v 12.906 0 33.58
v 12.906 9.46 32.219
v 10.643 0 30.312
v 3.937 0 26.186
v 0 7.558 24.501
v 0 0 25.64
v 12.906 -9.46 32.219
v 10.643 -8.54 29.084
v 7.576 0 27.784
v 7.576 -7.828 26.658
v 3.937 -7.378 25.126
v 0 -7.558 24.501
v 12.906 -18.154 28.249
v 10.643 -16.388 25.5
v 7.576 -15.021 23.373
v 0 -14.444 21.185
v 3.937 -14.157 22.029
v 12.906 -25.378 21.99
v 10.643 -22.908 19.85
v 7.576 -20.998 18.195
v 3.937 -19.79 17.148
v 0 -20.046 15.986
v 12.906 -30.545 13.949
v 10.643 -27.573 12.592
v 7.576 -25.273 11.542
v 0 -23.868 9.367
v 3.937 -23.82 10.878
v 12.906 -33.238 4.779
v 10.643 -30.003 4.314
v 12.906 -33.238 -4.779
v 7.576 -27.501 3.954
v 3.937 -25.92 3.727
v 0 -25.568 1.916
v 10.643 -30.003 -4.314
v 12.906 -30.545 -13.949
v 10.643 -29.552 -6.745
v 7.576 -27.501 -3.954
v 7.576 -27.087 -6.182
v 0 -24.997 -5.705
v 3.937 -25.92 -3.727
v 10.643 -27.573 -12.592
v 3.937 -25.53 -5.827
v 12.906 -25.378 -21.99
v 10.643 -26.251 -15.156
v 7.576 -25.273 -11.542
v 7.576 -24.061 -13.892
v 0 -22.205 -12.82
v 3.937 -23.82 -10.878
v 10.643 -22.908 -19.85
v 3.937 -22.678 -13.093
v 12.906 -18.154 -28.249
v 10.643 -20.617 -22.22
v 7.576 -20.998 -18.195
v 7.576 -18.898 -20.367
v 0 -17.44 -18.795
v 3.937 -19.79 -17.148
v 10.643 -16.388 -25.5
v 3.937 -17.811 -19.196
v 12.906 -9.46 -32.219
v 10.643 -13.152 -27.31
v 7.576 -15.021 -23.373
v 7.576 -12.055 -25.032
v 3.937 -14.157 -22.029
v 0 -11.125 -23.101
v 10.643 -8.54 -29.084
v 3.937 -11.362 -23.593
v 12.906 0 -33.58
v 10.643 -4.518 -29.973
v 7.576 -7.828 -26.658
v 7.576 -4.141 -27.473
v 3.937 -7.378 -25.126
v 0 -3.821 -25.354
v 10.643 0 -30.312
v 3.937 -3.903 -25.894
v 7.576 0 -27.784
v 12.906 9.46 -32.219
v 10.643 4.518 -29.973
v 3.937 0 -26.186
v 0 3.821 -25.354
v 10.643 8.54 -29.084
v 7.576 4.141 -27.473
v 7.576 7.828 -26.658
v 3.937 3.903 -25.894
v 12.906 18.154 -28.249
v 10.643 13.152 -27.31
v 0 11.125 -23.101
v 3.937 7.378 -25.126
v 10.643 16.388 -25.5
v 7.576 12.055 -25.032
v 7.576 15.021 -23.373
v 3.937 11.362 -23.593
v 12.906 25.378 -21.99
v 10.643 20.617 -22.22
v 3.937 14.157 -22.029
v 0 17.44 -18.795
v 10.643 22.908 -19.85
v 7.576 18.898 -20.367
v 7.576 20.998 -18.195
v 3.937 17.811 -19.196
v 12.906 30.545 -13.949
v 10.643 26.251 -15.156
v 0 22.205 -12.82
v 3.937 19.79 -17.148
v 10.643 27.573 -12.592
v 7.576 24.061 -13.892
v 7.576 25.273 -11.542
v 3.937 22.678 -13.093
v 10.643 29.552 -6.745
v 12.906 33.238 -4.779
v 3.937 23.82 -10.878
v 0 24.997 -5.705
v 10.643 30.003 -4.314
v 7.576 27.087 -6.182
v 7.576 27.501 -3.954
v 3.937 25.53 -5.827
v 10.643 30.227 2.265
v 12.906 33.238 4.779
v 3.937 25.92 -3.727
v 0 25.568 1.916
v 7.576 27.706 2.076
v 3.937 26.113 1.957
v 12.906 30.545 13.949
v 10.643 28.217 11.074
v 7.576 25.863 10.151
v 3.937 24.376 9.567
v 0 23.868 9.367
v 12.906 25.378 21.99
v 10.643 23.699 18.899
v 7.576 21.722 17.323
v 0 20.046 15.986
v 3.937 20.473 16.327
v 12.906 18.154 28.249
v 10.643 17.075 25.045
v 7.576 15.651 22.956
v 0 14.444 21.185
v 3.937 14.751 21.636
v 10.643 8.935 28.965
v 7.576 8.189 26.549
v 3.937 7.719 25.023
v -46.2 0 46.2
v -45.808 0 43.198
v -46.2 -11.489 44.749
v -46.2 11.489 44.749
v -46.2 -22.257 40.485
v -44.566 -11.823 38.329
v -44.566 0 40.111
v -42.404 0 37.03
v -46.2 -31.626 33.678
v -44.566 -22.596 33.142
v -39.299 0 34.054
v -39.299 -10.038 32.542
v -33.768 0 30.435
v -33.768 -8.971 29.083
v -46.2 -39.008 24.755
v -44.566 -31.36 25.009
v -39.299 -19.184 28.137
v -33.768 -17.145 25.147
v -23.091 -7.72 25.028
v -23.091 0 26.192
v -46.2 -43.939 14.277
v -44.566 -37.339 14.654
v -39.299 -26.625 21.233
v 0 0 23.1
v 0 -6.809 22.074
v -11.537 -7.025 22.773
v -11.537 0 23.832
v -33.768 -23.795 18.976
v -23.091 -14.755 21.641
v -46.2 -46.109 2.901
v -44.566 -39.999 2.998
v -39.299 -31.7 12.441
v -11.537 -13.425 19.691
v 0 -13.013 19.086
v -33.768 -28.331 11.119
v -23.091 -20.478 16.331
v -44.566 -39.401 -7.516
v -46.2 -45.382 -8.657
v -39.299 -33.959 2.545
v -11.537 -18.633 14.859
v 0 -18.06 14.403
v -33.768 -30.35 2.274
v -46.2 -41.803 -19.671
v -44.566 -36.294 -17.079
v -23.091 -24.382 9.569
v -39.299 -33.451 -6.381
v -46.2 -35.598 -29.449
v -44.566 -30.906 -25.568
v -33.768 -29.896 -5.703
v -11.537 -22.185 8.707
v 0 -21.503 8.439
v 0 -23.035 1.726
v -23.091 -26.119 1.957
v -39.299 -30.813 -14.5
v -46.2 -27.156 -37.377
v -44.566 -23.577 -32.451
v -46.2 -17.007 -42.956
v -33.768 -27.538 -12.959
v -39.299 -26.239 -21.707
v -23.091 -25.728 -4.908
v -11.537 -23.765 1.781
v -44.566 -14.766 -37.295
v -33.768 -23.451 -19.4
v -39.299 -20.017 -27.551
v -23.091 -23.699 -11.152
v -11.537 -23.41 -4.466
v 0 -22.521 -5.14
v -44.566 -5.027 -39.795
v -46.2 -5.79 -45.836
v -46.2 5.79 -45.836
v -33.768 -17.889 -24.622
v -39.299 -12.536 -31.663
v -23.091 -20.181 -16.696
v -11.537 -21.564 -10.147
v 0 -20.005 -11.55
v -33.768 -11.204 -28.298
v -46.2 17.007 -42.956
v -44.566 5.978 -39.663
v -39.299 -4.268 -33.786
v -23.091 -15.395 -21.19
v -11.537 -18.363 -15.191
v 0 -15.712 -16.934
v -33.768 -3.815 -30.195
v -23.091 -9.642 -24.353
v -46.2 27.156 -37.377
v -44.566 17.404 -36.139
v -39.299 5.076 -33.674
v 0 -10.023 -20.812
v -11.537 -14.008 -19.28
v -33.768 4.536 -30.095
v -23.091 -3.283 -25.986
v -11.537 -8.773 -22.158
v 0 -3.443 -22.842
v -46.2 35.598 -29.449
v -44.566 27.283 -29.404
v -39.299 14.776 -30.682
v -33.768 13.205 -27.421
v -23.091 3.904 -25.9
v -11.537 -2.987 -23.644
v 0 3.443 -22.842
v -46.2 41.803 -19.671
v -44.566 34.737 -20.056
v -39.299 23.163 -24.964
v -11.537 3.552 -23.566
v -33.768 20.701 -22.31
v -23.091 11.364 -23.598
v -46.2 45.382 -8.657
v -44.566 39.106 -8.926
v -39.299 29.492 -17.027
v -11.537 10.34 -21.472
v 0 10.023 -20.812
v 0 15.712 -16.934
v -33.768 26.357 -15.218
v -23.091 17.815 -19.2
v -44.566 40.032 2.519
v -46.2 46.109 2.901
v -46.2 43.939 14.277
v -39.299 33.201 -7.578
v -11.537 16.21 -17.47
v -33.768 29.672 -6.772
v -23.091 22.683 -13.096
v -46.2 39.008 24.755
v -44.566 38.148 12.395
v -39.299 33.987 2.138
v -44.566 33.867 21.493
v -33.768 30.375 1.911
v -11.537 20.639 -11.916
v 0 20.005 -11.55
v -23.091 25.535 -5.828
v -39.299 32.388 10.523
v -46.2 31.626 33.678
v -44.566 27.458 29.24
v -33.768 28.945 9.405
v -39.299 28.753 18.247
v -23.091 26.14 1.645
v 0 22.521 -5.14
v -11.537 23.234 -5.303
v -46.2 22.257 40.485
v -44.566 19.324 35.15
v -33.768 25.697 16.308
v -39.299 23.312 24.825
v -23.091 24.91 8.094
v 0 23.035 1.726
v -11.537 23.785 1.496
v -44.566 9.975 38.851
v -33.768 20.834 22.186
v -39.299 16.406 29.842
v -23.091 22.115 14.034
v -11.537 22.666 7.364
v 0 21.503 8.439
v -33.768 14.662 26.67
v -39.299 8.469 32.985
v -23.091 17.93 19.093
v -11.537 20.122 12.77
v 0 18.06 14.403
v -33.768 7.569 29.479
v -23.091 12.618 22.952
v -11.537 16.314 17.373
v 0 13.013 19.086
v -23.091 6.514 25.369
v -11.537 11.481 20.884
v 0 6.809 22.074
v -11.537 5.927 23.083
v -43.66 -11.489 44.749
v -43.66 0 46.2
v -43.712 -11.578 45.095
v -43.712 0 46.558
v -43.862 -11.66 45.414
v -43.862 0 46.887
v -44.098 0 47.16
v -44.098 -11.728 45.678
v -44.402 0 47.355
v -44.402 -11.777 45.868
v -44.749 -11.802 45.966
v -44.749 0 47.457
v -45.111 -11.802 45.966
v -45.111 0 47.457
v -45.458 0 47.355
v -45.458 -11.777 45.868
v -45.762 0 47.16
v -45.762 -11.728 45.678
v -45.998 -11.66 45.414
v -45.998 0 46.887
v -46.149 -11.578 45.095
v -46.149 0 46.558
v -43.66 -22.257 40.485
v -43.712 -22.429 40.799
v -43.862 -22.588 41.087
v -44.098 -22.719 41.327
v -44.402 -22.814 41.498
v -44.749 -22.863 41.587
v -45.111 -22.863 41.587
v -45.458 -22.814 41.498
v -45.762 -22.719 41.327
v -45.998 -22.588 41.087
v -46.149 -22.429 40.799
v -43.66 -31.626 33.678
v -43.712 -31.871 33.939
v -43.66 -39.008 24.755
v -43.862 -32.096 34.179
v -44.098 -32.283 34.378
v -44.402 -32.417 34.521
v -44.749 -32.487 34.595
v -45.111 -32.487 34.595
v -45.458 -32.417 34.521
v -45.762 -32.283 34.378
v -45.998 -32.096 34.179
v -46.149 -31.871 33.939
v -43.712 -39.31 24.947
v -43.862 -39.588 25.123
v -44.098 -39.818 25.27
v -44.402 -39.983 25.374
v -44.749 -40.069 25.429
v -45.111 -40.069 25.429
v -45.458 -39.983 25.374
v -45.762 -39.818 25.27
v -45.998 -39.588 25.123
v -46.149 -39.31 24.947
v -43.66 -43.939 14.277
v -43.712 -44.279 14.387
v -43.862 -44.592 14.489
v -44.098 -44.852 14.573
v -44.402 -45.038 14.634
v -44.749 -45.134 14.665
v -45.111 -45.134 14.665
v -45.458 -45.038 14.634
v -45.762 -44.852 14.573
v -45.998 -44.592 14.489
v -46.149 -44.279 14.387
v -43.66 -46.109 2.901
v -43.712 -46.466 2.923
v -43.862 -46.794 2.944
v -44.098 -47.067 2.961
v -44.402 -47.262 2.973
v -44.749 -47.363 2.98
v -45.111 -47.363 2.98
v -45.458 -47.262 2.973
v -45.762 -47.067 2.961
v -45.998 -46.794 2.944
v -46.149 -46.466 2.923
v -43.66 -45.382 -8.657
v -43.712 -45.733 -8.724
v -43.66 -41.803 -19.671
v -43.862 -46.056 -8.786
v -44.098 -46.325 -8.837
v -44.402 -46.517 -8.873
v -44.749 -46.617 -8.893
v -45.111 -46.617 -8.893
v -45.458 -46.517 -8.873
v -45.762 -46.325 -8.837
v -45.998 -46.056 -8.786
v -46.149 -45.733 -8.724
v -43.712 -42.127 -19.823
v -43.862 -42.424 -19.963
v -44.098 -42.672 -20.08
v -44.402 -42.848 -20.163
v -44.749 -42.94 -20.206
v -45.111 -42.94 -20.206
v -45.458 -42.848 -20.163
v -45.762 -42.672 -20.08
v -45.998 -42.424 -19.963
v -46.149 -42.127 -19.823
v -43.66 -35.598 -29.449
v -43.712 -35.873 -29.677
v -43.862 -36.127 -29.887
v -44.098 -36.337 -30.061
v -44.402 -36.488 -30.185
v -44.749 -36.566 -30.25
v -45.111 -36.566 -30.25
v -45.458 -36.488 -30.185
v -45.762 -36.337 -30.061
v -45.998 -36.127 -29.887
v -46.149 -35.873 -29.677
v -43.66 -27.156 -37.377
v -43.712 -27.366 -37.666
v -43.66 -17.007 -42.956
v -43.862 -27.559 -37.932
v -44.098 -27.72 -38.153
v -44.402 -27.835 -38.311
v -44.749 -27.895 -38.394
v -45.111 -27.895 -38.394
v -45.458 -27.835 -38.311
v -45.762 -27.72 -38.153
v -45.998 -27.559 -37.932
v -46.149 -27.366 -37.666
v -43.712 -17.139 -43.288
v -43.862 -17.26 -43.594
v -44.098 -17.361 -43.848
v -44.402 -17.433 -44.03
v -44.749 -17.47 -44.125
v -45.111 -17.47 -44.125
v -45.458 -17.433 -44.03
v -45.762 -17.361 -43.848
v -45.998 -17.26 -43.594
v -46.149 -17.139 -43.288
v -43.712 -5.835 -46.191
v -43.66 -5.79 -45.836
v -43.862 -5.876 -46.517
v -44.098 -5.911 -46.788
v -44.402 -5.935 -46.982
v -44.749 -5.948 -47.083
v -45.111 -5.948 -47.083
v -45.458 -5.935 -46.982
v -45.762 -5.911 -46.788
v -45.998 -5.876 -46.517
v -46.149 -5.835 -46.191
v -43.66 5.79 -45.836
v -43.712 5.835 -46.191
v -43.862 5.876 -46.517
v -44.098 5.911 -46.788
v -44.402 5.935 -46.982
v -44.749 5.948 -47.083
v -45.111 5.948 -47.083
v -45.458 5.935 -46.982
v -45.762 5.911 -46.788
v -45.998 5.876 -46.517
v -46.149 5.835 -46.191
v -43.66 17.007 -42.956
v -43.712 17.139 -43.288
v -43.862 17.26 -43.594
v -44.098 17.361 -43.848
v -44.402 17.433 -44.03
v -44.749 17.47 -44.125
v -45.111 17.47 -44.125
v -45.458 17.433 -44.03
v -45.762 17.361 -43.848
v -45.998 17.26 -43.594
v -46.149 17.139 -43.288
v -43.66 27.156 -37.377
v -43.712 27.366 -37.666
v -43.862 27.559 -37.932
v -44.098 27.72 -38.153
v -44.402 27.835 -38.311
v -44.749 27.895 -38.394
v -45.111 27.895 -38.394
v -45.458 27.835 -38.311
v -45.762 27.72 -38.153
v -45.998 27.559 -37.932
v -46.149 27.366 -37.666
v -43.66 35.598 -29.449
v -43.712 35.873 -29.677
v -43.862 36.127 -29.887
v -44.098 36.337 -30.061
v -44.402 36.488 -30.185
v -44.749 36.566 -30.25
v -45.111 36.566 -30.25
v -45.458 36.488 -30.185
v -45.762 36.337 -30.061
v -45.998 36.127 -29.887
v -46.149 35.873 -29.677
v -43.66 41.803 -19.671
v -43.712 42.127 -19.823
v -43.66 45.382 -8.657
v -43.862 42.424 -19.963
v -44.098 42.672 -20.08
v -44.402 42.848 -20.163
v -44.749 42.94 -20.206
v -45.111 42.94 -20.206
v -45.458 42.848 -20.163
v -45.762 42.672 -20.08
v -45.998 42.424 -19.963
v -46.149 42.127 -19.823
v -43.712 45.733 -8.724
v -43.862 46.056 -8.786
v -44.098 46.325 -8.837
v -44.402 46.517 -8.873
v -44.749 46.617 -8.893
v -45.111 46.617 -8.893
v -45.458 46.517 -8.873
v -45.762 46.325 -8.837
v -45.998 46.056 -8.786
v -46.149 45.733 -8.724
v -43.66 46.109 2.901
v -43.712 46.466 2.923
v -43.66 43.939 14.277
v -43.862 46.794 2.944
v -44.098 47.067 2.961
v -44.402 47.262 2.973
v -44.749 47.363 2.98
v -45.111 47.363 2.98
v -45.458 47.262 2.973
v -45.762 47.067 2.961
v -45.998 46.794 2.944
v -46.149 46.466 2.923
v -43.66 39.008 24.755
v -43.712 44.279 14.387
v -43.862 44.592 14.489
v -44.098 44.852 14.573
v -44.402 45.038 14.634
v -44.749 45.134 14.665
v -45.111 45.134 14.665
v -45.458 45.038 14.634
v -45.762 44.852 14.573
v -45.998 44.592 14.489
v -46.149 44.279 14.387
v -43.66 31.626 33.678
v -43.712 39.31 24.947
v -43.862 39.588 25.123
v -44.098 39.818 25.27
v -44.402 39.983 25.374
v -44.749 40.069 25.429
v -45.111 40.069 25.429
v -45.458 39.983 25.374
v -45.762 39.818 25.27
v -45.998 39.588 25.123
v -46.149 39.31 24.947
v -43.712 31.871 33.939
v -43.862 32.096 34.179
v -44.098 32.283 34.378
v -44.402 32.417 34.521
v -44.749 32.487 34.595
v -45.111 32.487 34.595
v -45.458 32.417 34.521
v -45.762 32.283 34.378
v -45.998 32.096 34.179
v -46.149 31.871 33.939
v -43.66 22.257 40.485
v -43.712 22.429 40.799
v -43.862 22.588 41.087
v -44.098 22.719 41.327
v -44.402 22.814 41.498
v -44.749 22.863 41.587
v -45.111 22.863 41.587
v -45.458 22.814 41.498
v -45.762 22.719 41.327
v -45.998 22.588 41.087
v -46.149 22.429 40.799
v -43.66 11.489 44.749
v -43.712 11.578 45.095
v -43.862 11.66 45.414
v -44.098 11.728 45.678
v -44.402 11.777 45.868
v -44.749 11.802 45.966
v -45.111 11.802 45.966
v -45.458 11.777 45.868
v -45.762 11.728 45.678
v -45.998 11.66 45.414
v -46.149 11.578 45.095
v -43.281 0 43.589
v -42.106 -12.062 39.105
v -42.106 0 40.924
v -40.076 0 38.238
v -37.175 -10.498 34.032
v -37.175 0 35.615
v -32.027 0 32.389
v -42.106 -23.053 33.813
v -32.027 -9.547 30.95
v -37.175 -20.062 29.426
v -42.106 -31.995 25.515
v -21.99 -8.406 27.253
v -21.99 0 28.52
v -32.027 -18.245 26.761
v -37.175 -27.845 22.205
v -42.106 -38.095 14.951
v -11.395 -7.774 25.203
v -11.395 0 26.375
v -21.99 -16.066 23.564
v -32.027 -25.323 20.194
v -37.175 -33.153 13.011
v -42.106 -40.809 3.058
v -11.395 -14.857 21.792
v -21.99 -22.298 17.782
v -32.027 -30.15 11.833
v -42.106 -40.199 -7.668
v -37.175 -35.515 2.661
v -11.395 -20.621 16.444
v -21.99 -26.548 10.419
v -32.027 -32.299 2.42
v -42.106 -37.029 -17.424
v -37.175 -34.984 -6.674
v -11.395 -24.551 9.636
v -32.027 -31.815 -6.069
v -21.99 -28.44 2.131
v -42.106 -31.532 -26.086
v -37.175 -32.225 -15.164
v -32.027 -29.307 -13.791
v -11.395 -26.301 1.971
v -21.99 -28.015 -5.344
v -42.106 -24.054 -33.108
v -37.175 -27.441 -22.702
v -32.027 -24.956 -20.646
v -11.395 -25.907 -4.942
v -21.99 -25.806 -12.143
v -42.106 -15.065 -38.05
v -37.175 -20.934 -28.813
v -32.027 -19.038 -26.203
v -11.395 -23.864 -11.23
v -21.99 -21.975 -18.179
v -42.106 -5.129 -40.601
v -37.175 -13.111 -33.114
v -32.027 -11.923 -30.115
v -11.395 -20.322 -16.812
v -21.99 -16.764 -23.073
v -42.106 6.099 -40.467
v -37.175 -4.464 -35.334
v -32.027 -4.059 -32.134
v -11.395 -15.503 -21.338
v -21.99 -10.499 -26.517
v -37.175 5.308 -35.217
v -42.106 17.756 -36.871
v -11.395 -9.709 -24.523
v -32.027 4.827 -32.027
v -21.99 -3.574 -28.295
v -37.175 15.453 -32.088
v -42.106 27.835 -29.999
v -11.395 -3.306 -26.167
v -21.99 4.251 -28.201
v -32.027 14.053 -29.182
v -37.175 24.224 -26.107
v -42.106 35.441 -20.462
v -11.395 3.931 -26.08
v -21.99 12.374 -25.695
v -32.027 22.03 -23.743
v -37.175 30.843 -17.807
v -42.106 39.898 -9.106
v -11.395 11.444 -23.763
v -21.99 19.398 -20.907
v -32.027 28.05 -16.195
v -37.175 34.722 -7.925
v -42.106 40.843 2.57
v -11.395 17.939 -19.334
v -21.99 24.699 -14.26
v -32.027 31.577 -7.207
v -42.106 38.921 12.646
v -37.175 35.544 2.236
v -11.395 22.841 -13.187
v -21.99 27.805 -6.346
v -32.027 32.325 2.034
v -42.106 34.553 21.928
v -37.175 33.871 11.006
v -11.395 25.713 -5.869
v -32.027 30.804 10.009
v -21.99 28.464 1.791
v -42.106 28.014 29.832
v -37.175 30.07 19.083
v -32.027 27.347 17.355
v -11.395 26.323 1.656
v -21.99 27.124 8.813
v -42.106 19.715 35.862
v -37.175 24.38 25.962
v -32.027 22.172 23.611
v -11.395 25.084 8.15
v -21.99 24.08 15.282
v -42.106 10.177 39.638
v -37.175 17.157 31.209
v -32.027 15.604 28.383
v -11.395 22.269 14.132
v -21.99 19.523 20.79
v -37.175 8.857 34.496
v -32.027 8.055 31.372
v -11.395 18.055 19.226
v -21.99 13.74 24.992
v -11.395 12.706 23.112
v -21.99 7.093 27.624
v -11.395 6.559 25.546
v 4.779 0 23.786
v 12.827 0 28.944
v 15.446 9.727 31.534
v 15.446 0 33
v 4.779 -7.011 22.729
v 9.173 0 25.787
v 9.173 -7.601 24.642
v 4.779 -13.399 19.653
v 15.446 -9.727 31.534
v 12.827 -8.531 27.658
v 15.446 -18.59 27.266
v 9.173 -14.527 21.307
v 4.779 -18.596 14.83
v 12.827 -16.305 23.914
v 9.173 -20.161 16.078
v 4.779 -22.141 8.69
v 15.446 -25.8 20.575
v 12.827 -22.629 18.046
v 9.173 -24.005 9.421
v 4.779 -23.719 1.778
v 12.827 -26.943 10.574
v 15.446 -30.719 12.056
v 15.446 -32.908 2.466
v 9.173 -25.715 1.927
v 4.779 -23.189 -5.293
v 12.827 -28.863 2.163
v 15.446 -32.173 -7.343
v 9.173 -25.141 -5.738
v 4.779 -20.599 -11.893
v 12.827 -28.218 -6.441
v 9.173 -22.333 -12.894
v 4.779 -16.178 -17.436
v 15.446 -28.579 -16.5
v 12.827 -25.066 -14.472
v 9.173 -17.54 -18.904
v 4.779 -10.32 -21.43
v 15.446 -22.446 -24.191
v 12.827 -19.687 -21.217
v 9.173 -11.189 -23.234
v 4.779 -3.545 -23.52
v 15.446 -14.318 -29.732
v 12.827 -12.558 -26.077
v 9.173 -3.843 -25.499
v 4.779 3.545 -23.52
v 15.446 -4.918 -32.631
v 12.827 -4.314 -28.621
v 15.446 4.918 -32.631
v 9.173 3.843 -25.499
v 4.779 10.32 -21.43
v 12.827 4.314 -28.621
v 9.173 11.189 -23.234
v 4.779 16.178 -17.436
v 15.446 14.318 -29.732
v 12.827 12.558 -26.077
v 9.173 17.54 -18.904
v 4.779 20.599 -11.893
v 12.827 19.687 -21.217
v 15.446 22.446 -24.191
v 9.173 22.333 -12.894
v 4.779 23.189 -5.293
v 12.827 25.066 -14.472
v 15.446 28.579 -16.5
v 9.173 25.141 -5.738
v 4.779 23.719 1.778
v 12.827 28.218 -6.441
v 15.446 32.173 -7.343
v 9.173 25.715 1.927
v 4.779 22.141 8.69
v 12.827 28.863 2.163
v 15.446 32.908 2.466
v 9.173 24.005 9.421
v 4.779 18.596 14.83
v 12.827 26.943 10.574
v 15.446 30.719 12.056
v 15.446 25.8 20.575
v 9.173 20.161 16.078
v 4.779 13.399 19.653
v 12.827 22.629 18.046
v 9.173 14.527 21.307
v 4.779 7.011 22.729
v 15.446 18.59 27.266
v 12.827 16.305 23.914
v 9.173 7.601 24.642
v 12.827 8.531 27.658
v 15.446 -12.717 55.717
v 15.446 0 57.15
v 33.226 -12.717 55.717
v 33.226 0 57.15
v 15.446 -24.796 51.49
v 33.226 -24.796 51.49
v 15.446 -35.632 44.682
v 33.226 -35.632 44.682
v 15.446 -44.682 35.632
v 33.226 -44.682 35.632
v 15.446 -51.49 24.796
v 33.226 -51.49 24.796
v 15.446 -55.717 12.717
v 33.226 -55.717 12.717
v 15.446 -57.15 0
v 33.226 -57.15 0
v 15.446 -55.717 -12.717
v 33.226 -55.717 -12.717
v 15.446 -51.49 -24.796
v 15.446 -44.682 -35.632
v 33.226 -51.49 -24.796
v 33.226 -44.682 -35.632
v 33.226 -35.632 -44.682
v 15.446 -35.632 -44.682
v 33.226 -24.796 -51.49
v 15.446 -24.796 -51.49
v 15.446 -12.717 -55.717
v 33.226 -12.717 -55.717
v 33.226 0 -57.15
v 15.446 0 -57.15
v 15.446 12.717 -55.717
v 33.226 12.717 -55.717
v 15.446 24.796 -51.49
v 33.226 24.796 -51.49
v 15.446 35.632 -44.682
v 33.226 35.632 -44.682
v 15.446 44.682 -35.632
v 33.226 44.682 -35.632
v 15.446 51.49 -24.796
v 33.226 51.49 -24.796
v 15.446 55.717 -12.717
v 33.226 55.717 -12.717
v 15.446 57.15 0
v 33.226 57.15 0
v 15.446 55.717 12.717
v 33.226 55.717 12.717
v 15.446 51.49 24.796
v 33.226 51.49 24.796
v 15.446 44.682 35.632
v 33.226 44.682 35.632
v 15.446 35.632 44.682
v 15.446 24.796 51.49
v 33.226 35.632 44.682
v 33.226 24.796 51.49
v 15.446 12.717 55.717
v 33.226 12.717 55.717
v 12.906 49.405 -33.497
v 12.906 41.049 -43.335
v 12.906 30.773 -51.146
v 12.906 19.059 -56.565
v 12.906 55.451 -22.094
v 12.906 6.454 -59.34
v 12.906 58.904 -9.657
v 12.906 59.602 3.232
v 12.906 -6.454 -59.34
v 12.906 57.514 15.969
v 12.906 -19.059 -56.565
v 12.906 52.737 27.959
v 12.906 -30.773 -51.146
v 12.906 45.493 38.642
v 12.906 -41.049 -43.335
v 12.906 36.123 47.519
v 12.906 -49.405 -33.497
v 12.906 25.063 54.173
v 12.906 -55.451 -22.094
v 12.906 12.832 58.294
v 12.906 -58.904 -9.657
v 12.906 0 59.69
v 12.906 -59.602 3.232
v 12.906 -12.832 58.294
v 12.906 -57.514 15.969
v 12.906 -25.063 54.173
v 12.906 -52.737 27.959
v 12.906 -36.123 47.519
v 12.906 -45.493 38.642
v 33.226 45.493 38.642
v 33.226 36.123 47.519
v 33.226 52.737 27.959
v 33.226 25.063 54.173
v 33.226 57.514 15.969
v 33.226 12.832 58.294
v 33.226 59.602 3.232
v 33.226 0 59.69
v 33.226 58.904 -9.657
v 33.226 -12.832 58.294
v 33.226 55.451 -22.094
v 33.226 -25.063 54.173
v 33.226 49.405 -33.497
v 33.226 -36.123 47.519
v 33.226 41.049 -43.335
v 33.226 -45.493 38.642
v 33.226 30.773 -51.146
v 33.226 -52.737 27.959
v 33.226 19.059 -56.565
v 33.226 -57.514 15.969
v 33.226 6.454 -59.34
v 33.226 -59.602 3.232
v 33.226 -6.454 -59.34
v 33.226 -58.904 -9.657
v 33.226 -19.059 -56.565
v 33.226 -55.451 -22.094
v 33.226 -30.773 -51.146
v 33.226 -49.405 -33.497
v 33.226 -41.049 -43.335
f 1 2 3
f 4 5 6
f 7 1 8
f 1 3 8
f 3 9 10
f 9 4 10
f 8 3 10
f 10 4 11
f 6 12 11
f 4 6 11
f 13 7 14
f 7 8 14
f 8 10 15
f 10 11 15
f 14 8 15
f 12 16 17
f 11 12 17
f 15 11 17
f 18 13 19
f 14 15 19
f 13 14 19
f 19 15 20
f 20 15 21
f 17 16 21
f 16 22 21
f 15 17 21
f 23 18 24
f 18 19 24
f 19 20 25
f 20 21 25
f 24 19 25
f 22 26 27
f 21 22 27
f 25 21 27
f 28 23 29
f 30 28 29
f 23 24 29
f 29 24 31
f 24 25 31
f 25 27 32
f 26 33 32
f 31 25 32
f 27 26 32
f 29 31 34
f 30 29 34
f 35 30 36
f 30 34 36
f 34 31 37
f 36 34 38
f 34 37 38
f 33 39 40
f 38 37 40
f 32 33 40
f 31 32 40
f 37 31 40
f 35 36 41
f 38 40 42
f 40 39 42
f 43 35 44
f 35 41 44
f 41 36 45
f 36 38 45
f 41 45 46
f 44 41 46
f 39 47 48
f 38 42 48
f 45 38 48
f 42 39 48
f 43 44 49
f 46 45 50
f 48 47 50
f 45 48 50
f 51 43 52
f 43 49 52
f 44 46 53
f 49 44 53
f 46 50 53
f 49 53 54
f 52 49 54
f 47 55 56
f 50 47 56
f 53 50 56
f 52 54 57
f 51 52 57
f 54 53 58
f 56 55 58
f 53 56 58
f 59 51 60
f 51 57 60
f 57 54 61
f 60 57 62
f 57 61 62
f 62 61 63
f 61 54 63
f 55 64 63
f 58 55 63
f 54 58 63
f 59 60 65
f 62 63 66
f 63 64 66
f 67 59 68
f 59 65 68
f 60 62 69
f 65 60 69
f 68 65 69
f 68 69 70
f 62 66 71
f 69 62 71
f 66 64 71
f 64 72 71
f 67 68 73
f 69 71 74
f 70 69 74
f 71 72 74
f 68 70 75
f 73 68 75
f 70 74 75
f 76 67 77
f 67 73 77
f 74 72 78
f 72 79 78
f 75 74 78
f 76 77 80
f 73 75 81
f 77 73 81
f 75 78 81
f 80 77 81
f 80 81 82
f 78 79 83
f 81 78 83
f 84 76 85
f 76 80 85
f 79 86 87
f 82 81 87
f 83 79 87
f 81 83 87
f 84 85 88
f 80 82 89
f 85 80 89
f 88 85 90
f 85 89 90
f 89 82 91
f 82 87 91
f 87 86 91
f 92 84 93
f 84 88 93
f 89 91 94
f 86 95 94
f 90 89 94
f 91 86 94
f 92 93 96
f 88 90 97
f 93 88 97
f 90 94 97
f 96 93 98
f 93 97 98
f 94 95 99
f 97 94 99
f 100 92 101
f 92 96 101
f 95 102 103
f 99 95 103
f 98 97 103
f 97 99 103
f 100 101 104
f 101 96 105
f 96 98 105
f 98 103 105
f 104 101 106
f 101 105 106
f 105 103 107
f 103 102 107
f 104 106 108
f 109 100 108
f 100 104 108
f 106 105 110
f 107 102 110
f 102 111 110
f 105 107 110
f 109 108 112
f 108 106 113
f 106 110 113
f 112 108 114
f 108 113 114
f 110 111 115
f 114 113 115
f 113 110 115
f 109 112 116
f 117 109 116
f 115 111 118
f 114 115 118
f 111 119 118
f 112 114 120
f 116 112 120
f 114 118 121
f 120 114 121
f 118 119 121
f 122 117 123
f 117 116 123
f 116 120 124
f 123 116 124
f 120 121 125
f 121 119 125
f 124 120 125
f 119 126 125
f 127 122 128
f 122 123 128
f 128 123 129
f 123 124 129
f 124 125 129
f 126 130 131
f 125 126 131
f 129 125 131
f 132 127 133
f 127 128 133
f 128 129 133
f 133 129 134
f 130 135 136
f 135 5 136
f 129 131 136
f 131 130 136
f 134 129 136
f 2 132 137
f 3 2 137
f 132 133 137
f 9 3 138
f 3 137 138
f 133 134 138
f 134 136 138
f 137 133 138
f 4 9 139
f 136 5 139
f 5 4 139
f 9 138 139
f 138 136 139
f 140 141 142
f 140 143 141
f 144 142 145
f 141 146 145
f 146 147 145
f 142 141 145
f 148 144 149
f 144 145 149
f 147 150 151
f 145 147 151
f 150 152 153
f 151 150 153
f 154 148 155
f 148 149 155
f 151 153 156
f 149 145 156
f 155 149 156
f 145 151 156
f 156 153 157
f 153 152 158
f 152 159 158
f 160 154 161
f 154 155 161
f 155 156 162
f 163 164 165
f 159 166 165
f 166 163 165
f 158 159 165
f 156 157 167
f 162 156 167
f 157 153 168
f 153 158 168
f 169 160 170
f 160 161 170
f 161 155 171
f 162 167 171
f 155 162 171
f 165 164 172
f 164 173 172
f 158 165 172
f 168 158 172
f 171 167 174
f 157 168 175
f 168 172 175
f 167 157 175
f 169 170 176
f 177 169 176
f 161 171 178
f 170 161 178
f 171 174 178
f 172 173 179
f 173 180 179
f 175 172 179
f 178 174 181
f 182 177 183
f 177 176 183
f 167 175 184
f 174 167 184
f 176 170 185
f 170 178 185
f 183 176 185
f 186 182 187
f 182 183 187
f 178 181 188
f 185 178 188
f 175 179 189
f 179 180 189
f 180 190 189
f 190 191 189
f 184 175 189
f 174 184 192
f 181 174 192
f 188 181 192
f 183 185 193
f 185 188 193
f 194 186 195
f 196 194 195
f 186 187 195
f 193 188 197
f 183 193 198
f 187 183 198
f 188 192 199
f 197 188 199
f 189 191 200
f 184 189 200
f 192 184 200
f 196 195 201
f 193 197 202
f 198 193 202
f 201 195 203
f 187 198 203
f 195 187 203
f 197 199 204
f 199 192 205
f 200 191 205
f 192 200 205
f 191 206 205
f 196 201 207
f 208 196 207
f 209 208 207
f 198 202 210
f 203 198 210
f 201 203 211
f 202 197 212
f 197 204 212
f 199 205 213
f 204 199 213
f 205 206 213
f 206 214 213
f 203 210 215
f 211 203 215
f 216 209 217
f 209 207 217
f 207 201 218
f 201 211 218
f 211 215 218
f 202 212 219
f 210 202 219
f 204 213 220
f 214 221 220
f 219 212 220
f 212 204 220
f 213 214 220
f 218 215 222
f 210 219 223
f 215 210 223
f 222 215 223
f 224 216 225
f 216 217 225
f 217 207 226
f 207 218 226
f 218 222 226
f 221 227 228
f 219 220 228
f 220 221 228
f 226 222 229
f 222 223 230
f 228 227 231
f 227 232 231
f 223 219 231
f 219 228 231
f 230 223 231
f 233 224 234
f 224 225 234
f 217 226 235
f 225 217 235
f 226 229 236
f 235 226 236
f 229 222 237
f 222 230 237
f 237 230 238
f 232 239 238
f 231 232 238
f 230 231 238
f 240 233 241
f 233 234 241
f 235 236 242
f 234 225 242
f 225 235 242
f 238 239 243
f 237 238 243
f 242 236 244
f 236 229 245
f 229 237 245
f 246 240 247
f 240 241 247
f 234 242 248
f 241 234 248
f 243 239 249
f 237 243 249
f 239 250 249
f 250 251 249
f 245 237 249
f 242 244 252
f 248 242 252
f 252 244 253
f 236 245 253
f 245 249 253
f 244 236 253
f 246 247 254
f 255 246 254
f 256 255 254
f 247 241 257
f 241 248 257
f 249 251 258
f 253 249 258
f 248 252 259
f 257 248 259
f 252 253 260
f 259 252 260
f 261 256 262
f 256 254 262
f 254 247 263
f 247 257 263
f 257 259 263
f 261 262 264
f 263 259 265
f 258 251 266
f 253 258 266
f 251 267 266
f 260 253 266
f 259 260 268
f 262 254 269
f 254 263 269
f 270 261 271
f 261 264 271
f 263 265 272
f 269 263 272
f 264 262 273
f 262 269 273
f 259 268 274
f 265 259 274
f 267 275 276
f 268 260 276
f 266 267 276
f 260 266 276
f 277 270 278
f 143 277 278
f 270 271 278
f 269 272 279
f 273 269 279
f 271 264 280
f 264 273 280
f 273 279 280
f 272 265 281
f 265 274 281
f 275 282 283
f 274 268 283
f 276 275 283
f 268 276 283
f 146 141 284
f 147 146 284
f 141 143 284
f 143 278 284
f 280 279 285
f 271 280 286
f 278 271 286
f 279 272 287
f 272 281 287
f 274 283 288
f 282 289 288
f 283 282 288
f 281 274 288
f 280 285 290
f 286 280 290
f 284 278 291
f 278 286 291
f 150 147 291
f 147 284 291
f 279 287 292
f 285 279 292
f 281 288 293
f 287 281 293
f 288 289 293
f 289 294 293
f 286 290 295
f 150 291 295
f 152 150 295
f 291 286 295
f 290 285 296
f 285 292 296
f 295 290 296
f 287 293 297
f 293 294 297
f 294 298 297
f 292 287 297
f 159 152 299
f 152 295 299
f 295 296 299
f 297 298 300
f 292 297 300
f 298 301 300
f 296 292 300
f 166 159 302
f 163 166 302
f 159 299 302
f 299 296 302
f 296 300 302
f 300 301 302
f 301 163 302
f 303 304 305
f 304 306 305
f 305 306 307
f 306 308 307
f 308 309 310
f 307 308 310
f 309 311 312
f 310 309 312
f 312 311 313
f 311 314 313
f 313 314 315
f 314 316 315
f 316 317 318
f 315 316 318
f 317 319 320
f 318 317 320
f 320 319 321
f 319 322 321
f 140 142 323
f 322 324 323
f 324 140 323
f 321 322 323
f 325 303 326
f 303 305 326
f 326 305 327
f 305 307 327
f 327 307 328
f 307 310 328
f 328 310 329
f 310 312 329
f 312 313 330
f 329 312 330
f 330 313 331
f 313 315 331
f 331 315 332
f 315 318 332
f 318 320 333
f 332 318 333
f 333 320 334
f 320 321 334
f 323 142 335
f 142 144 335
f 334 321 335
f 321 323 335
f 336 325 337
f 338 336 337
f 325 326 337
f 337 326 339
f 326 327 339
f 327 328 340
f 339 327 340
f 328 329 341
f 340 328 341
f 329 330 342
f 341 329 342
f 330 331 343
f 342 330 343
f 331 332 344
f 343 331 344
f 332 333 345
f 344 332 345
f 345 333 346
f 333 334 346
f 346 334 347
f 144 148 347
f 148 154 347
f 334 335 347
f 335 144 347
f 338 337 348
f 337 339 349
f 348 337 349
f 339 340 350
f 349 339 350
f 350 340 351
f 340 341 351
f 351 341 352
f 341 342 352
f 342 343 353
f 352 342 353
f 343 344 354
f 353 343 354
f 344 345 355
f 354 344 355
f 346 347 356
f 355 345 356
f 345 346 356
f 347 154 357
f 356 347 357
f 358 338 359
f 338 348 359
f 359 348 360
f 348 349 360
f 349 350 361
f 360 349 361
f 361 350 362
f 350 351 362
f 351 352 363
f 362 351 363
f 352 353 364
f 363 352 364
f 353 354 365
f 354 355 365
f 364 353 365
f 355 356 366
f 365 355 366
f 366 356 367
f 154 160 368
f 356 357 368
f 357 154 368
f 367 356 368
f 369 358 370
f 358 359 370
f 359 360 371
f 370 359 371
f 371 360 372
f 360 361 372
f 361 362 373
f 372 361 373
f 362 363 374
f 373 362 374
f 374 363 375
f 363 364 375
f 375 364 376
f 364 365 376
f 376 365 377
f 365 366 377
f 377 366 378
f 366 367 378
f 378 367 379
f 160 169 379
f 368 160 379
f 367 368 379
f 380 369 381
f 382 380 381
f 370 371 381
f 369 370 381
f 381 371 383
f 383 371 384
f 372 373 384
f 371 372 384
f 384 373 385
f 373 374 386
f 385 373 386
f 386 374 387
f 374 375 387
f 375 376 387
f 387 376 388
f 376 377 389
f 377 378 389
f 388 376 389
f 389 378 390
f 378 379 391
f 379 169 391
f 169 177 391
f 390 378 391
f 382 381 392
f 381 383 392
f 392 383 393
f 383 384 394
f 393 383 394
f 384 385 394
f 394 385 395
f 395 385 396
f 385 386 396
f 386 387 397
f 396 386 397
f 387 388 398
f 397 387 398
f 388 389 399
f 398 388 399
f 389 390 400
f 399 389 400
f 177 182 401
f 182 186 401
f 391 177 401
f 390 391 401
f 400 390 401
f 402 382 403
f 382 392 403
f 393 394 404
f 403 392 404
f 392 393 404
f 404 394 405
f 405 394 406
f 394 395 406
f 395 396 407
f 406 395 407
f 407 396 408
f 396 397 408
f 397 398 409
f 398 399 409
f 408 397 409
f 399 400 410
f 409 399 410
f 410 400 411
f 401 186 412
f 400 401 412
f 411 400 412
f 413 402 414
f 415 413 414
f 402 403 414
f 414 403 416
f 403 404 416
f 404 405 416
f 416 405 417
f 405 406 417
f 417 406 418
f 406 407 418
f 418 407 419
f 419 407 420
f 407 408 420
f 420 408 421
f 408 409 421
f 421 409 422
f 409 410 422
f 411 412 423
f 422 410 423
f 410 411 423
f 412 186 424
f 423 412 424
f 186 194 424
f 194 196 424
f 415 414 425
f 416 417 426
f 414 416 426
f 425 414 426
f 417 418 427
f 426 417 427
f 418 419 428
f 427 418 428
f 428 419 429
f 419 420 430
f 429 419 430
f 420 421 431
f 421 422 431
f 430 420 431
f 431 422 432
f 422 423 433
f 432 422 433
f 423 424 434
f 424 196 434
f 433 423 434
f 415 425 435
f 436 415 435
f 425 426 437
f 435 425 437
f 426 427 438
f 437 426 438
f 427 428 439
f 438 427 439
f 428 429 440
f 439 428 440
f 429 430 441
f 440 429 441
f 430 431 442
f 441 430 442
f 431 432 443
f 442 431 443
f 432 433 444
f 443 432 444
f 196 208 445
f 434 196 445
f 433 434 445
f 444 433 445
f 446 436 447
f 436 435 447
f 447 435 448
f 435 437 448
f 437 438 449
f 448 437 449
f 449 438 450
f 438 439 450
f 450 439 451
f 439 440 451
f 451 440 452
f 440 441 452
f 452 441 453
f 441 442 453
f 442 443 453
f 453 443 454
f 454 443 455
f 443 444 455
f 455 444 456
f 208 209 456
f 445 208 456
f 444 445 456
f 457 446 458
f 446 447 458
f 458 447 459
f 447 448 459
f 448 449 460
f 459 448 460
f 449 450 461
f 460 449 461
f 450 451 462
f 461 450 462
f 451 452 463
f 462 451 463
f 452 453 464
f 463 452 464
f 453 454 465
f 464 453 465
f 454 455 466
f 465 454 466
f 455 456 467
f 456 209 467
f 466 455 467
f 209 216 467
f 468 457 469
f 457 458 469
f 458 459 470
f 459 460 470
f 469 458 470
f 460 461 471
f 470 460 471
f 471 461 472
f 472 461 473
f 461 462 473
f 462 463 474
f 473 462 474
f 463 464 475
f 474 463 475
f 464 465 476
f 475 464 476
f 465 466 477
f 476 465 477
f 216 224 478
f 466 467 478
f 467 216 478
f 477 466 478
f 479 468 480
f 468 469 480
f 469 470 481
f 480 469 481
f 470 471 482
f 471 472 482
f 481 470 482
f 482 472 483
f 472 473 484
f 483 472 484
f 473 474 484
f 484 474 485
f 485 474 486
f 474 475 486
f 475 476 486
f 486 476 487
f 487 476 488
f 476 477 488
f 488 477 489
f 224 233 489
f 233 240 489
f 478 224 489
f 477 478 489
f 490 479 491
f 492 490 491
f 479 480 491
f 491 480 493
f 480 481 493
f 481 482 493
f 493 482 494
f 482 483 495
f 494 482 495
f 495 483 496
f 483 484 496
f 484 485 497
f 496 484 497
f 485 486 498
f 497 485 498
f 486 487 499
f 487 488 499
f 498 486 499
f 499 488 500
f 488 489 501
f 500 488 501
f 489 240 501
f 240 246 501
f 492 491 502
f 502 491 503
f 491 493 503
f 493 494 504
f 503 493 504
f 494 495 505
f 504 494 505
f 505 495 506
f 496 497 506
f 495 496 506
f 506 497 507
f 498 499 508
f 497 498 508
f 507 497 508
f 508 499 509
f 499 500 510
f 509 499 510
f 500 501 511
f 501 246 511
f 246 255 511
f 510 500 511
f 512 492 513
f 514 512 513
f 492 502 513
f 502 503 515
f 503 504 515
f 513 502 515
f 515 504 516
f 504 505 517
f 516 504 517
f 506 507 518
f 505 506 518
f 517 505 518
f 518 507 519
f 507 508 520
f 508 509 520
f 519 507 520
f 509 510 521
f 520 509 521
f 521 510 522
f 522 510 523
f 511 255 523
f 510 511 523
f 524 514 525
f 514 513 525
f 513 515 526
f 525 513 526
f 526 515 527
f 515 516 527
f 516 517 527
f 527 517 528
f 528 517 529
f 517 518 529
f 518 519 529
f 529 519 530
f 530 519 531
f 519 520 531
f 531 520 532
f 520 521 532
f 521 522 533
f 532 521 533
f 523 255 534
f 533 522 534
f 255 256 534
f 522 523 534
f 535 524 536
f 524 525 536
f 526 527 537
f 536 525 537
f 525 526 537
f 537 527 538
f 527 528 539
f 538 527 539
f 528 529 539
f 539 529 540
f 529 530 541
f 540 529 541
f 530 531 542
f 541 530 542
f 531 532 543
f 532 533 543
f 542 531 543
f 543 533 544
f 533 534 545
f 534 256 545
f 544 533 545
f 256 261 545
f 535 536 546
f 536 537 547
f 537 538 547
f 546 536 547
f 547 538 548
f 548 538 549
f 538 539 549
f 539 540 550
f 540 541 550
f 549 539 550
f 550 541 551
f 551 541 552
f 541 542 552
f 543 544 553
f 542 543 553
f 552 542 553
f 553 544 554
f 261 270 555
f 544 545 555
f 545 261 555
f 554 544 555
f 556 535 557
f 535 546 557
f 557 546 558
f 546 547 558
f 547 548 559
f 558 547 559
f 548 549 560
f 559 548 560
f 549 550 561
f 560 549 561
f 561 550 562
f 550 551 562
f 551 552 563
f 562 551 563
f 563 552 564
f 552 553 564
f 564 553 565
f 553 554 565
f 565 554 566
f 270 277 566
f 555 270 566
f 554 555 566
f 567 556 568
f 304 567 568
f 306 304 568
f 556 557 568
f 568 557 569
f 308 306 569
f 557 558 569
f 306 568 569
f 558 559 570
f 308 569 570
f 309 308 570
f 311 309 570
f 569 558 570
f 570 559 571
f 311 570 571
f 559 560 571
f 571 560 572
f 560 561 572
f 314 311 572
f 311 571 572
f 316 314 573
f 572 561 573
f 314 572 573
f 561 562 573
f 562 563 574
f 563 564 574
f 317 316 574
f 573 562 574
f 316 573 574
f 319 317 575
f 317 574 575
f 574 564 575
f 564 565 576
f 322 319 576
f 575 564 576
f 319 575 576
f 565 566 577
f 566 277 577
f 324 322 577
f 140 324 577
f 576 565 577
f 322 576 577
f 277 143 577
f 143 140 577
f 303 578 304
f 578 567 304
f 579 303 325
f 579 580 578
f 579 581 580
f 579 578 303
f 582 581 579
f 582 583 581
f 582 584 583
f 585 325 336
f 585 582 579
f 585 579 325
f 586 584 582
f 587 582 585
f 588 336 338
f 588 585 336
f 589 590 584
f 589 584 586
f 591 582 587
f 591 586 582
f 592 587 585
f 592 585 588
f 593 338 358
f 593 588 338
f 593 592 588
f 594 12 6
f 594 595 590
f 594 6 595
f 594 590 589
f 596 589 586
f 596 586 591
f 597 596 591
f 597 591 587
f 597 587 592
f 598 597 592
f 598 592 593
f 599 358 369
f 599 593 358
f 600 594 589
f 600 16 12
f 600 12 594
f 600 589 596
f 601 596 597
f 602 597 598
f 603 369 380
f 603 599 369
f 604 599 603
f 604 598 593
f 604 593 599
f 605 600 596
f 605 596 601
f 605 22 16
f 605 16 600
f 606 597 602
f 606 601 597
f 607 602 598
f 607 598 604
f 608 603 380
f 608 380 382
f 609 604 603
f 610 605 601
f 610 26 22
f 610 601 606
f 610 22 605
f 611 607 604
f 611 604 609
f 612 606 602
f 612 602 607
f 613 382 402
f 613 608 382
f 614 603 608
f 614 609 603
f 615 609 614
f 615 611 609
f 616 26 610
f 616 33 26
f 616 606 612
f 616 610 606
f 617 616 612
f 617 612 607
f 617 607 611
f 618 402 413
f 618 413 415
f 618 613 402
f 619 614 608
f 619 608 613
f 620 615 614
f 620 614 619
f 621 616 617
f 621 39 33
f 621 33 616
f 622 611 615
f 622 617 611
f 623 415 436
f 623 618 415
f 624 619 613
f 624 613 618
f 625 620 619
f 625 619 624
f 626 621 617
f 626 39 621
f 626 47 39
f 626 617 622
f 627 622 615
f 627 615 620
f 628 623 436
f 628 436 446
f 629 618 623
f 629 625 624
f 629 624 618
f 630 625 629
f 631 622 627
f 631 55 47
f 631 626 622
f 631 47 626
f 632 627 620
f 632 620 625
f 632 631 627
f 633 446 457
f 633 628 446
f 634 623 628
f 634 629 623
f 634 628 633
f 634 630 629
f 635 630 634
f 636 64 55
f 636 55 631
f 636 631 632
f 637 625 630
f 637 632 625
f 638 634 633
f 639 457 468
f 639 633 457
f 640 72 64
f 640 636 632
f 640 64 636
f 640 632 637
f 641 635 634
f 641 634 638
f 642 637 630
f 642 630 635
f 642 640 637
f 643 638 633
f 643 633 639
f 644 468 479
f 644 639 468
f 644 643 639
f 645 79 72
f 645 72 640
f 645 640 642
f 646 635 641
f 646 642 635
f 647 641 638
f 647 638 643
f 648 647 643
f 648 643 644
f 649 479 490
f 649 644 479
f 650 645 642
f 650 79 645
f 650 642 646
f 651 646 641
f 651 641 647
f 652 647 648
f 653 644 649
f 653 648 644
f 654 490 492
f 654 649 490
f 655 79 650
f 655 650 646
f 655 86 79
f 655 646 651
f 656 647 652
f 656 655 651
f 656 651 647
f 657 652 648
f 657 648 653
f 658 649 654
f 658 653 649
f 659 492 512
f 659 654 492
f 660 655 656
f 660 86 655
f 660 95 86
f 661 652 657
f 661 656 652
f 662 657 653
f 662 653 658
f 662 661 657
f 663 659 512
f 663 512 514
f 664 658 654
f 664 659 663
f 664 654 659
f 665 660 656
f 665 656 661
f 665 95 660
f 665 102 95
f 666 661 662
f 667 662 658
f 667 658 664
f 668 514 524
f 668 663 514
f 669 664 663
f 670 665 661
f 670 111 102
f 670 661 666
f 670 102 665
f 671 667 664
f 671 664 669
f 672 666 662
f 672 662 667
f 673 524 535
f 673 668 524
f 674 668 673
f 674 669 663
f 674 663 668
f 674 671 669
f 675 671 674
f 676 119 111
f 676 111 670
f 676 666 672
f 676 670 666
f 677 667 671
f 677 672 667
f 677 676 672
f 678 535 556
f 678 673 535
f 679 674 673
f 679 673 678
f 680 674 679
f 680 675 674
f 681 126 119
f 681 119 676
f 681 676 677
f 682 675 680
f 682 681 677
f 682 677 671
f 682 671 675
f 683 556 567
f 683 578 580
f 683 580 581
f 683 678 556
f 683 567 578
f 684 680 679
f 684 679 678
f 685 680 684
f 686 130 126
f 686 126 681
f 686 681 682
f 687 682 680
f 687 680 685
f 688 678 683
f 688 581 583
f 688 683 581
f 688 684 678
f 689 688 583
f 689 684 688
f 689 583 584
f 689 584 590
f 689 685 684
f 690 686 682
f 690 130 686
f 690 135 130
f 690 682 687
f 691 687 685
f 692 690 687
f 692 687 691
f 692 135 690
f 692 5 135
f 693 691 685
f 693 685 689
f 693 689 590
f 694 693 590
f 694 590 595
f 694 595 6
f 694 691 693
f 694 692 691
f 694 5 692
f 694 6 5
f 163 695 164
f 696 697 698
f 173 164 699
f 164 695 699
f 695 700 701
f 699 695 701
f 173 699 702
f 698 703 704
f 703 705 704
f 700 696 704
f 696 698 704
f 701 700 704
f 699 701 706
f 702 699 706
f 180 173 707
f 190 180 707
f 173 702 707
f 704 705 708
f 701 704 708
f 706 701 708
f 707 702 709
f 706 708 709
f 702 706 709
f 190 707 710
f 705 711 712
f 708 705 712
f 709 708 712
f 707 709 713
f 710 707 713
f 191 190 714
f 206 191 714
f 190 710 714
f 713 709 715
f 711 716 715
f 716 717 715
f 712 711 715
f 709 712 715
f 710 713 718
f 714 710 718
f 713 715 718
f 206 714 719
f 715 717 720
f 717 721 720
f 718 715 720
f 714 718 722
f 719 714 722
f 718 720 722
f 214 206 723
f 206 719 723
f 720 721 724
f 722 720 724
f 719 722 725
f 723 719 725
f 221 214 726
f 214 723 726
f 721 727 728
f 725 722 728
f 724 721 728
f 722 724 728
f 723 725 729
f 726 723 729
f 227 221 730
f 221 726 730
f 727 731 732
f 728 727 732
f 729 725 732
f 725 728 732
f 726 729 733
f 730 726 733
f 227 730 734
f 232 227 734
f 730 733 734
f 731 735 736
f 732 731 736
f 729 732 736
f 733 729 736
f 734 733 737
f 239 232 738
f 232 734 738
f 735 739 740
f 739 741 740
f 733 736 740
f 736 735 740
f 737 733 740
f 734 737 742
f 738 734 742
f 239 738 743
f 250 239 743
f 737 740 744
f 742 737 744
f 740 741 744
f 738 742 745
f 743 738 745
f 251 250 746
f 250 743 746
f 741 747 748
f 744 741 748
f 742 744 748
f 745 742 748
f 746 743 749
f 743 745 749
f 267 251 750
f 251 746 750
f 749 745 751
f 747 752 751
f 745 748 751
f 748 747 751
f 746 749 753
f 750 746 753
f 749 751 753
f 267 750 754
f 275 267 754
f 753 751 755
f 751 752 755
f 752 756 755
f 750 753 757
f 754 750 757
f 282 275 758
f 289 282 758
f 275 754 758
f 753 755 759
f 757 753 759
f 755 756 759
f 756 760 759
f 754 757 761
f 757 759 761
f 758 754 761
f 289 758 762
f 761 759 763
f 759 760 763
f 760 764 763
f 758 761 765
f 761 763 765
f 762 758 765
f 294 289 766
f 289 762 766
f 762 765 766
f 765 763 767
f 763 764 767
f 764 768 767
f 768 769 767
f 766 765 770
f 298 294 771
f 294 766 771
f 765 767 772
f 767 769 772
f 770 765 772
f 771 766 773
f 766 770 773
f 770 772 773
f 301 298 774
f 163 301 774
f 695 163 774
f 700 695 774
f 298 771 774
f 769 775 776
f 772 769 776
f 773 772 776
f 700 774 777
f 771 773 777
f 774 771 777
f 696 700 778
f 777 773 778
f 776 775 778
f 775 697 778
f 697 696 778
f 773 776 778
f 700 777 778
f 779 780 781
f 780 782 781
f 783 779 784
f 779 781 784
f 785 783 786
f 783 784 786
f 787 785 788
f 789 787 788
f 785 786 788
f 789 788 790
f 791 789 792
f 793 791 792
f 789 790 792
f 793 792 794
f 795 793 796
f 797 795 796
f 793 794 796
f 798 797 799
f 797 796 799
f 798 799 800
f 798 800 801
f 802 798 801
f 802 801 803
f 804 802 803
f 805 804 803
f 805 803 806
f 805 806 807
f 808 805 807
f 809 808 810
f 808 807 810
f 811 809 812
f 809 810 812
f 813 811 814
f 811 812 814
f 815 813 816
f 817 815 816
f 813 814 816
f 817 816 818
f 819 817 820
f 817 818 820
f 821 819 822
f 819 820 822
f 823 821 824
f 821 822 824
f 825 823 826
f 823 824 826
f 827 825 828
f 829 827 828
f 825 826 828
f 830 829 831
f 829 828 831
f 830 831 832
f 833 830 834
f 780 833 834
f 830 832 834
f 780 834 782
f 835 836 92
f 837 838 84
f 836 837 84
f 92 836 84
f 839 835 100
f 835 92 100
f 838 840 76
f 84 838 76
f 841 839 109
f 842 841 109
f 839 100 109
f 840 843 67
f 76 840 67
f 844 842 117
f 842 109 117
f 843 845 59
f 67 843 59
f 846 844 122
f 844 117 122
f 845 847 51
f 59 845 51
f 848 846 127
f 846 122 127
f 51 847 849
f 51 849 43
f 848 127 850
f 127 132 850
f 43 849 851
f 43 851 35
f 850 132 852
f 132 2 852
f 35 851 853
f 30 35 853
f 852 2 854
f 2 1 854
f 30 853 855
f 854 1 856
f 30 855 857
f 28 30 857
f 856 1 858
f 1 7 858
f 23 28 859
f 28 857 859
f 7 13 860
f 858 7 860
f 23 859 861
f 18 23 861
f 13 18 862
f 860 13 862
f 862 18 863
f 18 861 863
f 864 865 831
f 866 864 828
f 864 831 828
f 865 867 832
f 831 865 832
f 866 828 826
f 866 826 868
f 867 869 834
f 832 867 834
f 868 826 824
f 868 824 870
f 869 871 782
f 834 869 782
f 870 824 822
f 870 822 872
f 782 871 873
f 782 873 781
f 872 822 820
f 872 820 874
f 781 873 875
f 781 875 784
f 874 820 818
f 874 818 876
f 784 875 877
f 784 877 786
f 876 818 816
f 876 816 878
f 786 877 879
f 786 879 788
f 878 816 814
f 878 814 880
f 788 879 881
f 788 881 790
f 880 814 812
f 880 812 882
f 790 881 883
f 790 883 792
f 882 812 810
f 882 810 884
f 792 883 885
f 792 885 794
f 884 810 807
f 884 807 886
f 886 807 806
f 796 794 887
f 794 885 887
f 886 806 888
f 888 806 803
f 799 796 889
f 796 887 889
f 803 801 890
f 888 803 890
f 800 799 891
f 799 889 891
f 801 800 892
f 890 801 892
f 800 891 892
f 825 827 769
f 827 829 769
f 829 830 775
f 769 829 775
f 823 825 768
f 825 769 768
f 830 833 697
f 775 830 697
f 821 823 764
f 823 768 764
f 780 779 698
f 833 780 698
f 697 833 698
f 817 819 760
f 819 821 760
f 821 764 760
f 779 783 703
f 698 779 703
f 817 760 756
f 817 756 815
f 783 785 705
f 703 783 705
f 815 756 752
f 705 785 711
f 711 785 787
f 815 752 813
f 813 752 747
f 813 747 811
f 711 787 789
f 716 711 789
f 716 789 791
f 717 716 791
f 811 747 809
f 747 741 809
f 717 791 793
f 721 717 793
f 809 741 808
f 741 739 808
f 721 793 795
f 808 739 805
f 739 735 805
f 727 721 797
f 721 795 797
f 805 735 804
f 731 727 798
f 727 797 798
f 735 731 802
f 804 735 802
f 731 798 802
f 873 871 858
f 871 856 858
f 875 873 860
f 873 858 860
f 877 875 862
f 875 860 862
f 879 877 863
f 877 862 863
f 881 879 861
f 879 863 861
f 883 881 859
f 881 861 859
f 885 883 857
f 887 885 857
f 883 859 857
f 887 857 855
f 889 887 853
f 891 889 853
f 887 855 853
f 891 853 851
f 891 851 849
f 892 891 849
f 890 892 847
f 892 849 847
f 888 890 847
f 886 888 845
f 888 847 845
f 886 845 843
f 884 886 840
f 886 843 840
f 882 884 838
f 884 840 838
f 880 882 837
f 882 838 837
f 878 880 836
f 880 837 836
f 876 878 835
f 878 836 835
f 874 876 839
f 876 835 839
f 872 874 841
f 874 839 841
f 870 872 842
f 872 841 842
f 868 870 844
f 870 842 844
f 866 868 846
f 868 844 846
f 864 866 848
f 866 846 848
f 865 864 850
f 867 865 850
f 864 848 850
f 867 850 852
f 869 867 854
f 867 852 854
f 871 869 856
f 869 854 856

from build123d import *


with BuildPart() as part:
    # Sketch1 → Revolve1 (revolve)
    with BuildSketch(Plane.XY, mode=Mode.PRIVATE) as revolve1_sk:
        with BuildLine():
            Line((15.446351252, 33.000061), (15.446351252, 57.15))
            Line((15.446351252, 57.15), (33.226351252, 57.15))
            Line((33.226351252, 57.15), (33.226351252, 59.69))
            Line((33.226351252, 59.69), (12.906351252, 59.69))
            Line((12.906351252, 59.69), (12.906351252, 33.579511809))
            ThreePointArc((12.906351252, 33.579511809), (7.576431779, 27.783815658), (0, 25.64003))
            add(Edge.make_bspline(
                [(-43.66006, 46.20006), (-43.66006, 45.606103818), (-43.544794528, 44.432570076), (-42.839776678, 42.039054169), (-41.001665327, 38.971251765), (-37.14971819, 35.345133748), (-31.752396376, 32.048371643), (-25.035415413, 29.287682921), (-17.281065772, 27.214070609), (-8.82958884, 25.929831174), (-2.92413983, 25.64003), (0, 25.64003)],
                knots=[3.141592654, 3.141592654, 3.141592654, 3.141592654, 3.239767424, 3.337942194, 3.534291735, 3.730641276, 3.926990817, 4.123340358, 4.319689899, 4.51603944, 4.71238898, 4.71238898, 4.71238898, 4.71238898], degree=3))
            ThreePointArc((-43.66006, 46.20006), (-44.93006, 47.47006), (-46.20006, 46.20006))
            add(Edge.make_bspline(
                [(-46.20006, 46.20006), (-46.20006, 23.10003), (0, 23.10003)],
                knots=[3.141592654, 3.141592654, 3.141592654, 4.71238898, 4.71238898, 4.71238898], degree=2, weights=[1, 0.707106781, 1]))
            ThreePointArc((0, 23.10003), (9.1733361, 25.787457832), (15.446351252, 33.000061))
        make_face()
    revolve(revolve1_sk.sketch.rotate(Axis((0, 0, 0), (1, 0, 0)), 90), axis=Axis((0, 0, 0), (1, 0, 0)))


solid = part.part
